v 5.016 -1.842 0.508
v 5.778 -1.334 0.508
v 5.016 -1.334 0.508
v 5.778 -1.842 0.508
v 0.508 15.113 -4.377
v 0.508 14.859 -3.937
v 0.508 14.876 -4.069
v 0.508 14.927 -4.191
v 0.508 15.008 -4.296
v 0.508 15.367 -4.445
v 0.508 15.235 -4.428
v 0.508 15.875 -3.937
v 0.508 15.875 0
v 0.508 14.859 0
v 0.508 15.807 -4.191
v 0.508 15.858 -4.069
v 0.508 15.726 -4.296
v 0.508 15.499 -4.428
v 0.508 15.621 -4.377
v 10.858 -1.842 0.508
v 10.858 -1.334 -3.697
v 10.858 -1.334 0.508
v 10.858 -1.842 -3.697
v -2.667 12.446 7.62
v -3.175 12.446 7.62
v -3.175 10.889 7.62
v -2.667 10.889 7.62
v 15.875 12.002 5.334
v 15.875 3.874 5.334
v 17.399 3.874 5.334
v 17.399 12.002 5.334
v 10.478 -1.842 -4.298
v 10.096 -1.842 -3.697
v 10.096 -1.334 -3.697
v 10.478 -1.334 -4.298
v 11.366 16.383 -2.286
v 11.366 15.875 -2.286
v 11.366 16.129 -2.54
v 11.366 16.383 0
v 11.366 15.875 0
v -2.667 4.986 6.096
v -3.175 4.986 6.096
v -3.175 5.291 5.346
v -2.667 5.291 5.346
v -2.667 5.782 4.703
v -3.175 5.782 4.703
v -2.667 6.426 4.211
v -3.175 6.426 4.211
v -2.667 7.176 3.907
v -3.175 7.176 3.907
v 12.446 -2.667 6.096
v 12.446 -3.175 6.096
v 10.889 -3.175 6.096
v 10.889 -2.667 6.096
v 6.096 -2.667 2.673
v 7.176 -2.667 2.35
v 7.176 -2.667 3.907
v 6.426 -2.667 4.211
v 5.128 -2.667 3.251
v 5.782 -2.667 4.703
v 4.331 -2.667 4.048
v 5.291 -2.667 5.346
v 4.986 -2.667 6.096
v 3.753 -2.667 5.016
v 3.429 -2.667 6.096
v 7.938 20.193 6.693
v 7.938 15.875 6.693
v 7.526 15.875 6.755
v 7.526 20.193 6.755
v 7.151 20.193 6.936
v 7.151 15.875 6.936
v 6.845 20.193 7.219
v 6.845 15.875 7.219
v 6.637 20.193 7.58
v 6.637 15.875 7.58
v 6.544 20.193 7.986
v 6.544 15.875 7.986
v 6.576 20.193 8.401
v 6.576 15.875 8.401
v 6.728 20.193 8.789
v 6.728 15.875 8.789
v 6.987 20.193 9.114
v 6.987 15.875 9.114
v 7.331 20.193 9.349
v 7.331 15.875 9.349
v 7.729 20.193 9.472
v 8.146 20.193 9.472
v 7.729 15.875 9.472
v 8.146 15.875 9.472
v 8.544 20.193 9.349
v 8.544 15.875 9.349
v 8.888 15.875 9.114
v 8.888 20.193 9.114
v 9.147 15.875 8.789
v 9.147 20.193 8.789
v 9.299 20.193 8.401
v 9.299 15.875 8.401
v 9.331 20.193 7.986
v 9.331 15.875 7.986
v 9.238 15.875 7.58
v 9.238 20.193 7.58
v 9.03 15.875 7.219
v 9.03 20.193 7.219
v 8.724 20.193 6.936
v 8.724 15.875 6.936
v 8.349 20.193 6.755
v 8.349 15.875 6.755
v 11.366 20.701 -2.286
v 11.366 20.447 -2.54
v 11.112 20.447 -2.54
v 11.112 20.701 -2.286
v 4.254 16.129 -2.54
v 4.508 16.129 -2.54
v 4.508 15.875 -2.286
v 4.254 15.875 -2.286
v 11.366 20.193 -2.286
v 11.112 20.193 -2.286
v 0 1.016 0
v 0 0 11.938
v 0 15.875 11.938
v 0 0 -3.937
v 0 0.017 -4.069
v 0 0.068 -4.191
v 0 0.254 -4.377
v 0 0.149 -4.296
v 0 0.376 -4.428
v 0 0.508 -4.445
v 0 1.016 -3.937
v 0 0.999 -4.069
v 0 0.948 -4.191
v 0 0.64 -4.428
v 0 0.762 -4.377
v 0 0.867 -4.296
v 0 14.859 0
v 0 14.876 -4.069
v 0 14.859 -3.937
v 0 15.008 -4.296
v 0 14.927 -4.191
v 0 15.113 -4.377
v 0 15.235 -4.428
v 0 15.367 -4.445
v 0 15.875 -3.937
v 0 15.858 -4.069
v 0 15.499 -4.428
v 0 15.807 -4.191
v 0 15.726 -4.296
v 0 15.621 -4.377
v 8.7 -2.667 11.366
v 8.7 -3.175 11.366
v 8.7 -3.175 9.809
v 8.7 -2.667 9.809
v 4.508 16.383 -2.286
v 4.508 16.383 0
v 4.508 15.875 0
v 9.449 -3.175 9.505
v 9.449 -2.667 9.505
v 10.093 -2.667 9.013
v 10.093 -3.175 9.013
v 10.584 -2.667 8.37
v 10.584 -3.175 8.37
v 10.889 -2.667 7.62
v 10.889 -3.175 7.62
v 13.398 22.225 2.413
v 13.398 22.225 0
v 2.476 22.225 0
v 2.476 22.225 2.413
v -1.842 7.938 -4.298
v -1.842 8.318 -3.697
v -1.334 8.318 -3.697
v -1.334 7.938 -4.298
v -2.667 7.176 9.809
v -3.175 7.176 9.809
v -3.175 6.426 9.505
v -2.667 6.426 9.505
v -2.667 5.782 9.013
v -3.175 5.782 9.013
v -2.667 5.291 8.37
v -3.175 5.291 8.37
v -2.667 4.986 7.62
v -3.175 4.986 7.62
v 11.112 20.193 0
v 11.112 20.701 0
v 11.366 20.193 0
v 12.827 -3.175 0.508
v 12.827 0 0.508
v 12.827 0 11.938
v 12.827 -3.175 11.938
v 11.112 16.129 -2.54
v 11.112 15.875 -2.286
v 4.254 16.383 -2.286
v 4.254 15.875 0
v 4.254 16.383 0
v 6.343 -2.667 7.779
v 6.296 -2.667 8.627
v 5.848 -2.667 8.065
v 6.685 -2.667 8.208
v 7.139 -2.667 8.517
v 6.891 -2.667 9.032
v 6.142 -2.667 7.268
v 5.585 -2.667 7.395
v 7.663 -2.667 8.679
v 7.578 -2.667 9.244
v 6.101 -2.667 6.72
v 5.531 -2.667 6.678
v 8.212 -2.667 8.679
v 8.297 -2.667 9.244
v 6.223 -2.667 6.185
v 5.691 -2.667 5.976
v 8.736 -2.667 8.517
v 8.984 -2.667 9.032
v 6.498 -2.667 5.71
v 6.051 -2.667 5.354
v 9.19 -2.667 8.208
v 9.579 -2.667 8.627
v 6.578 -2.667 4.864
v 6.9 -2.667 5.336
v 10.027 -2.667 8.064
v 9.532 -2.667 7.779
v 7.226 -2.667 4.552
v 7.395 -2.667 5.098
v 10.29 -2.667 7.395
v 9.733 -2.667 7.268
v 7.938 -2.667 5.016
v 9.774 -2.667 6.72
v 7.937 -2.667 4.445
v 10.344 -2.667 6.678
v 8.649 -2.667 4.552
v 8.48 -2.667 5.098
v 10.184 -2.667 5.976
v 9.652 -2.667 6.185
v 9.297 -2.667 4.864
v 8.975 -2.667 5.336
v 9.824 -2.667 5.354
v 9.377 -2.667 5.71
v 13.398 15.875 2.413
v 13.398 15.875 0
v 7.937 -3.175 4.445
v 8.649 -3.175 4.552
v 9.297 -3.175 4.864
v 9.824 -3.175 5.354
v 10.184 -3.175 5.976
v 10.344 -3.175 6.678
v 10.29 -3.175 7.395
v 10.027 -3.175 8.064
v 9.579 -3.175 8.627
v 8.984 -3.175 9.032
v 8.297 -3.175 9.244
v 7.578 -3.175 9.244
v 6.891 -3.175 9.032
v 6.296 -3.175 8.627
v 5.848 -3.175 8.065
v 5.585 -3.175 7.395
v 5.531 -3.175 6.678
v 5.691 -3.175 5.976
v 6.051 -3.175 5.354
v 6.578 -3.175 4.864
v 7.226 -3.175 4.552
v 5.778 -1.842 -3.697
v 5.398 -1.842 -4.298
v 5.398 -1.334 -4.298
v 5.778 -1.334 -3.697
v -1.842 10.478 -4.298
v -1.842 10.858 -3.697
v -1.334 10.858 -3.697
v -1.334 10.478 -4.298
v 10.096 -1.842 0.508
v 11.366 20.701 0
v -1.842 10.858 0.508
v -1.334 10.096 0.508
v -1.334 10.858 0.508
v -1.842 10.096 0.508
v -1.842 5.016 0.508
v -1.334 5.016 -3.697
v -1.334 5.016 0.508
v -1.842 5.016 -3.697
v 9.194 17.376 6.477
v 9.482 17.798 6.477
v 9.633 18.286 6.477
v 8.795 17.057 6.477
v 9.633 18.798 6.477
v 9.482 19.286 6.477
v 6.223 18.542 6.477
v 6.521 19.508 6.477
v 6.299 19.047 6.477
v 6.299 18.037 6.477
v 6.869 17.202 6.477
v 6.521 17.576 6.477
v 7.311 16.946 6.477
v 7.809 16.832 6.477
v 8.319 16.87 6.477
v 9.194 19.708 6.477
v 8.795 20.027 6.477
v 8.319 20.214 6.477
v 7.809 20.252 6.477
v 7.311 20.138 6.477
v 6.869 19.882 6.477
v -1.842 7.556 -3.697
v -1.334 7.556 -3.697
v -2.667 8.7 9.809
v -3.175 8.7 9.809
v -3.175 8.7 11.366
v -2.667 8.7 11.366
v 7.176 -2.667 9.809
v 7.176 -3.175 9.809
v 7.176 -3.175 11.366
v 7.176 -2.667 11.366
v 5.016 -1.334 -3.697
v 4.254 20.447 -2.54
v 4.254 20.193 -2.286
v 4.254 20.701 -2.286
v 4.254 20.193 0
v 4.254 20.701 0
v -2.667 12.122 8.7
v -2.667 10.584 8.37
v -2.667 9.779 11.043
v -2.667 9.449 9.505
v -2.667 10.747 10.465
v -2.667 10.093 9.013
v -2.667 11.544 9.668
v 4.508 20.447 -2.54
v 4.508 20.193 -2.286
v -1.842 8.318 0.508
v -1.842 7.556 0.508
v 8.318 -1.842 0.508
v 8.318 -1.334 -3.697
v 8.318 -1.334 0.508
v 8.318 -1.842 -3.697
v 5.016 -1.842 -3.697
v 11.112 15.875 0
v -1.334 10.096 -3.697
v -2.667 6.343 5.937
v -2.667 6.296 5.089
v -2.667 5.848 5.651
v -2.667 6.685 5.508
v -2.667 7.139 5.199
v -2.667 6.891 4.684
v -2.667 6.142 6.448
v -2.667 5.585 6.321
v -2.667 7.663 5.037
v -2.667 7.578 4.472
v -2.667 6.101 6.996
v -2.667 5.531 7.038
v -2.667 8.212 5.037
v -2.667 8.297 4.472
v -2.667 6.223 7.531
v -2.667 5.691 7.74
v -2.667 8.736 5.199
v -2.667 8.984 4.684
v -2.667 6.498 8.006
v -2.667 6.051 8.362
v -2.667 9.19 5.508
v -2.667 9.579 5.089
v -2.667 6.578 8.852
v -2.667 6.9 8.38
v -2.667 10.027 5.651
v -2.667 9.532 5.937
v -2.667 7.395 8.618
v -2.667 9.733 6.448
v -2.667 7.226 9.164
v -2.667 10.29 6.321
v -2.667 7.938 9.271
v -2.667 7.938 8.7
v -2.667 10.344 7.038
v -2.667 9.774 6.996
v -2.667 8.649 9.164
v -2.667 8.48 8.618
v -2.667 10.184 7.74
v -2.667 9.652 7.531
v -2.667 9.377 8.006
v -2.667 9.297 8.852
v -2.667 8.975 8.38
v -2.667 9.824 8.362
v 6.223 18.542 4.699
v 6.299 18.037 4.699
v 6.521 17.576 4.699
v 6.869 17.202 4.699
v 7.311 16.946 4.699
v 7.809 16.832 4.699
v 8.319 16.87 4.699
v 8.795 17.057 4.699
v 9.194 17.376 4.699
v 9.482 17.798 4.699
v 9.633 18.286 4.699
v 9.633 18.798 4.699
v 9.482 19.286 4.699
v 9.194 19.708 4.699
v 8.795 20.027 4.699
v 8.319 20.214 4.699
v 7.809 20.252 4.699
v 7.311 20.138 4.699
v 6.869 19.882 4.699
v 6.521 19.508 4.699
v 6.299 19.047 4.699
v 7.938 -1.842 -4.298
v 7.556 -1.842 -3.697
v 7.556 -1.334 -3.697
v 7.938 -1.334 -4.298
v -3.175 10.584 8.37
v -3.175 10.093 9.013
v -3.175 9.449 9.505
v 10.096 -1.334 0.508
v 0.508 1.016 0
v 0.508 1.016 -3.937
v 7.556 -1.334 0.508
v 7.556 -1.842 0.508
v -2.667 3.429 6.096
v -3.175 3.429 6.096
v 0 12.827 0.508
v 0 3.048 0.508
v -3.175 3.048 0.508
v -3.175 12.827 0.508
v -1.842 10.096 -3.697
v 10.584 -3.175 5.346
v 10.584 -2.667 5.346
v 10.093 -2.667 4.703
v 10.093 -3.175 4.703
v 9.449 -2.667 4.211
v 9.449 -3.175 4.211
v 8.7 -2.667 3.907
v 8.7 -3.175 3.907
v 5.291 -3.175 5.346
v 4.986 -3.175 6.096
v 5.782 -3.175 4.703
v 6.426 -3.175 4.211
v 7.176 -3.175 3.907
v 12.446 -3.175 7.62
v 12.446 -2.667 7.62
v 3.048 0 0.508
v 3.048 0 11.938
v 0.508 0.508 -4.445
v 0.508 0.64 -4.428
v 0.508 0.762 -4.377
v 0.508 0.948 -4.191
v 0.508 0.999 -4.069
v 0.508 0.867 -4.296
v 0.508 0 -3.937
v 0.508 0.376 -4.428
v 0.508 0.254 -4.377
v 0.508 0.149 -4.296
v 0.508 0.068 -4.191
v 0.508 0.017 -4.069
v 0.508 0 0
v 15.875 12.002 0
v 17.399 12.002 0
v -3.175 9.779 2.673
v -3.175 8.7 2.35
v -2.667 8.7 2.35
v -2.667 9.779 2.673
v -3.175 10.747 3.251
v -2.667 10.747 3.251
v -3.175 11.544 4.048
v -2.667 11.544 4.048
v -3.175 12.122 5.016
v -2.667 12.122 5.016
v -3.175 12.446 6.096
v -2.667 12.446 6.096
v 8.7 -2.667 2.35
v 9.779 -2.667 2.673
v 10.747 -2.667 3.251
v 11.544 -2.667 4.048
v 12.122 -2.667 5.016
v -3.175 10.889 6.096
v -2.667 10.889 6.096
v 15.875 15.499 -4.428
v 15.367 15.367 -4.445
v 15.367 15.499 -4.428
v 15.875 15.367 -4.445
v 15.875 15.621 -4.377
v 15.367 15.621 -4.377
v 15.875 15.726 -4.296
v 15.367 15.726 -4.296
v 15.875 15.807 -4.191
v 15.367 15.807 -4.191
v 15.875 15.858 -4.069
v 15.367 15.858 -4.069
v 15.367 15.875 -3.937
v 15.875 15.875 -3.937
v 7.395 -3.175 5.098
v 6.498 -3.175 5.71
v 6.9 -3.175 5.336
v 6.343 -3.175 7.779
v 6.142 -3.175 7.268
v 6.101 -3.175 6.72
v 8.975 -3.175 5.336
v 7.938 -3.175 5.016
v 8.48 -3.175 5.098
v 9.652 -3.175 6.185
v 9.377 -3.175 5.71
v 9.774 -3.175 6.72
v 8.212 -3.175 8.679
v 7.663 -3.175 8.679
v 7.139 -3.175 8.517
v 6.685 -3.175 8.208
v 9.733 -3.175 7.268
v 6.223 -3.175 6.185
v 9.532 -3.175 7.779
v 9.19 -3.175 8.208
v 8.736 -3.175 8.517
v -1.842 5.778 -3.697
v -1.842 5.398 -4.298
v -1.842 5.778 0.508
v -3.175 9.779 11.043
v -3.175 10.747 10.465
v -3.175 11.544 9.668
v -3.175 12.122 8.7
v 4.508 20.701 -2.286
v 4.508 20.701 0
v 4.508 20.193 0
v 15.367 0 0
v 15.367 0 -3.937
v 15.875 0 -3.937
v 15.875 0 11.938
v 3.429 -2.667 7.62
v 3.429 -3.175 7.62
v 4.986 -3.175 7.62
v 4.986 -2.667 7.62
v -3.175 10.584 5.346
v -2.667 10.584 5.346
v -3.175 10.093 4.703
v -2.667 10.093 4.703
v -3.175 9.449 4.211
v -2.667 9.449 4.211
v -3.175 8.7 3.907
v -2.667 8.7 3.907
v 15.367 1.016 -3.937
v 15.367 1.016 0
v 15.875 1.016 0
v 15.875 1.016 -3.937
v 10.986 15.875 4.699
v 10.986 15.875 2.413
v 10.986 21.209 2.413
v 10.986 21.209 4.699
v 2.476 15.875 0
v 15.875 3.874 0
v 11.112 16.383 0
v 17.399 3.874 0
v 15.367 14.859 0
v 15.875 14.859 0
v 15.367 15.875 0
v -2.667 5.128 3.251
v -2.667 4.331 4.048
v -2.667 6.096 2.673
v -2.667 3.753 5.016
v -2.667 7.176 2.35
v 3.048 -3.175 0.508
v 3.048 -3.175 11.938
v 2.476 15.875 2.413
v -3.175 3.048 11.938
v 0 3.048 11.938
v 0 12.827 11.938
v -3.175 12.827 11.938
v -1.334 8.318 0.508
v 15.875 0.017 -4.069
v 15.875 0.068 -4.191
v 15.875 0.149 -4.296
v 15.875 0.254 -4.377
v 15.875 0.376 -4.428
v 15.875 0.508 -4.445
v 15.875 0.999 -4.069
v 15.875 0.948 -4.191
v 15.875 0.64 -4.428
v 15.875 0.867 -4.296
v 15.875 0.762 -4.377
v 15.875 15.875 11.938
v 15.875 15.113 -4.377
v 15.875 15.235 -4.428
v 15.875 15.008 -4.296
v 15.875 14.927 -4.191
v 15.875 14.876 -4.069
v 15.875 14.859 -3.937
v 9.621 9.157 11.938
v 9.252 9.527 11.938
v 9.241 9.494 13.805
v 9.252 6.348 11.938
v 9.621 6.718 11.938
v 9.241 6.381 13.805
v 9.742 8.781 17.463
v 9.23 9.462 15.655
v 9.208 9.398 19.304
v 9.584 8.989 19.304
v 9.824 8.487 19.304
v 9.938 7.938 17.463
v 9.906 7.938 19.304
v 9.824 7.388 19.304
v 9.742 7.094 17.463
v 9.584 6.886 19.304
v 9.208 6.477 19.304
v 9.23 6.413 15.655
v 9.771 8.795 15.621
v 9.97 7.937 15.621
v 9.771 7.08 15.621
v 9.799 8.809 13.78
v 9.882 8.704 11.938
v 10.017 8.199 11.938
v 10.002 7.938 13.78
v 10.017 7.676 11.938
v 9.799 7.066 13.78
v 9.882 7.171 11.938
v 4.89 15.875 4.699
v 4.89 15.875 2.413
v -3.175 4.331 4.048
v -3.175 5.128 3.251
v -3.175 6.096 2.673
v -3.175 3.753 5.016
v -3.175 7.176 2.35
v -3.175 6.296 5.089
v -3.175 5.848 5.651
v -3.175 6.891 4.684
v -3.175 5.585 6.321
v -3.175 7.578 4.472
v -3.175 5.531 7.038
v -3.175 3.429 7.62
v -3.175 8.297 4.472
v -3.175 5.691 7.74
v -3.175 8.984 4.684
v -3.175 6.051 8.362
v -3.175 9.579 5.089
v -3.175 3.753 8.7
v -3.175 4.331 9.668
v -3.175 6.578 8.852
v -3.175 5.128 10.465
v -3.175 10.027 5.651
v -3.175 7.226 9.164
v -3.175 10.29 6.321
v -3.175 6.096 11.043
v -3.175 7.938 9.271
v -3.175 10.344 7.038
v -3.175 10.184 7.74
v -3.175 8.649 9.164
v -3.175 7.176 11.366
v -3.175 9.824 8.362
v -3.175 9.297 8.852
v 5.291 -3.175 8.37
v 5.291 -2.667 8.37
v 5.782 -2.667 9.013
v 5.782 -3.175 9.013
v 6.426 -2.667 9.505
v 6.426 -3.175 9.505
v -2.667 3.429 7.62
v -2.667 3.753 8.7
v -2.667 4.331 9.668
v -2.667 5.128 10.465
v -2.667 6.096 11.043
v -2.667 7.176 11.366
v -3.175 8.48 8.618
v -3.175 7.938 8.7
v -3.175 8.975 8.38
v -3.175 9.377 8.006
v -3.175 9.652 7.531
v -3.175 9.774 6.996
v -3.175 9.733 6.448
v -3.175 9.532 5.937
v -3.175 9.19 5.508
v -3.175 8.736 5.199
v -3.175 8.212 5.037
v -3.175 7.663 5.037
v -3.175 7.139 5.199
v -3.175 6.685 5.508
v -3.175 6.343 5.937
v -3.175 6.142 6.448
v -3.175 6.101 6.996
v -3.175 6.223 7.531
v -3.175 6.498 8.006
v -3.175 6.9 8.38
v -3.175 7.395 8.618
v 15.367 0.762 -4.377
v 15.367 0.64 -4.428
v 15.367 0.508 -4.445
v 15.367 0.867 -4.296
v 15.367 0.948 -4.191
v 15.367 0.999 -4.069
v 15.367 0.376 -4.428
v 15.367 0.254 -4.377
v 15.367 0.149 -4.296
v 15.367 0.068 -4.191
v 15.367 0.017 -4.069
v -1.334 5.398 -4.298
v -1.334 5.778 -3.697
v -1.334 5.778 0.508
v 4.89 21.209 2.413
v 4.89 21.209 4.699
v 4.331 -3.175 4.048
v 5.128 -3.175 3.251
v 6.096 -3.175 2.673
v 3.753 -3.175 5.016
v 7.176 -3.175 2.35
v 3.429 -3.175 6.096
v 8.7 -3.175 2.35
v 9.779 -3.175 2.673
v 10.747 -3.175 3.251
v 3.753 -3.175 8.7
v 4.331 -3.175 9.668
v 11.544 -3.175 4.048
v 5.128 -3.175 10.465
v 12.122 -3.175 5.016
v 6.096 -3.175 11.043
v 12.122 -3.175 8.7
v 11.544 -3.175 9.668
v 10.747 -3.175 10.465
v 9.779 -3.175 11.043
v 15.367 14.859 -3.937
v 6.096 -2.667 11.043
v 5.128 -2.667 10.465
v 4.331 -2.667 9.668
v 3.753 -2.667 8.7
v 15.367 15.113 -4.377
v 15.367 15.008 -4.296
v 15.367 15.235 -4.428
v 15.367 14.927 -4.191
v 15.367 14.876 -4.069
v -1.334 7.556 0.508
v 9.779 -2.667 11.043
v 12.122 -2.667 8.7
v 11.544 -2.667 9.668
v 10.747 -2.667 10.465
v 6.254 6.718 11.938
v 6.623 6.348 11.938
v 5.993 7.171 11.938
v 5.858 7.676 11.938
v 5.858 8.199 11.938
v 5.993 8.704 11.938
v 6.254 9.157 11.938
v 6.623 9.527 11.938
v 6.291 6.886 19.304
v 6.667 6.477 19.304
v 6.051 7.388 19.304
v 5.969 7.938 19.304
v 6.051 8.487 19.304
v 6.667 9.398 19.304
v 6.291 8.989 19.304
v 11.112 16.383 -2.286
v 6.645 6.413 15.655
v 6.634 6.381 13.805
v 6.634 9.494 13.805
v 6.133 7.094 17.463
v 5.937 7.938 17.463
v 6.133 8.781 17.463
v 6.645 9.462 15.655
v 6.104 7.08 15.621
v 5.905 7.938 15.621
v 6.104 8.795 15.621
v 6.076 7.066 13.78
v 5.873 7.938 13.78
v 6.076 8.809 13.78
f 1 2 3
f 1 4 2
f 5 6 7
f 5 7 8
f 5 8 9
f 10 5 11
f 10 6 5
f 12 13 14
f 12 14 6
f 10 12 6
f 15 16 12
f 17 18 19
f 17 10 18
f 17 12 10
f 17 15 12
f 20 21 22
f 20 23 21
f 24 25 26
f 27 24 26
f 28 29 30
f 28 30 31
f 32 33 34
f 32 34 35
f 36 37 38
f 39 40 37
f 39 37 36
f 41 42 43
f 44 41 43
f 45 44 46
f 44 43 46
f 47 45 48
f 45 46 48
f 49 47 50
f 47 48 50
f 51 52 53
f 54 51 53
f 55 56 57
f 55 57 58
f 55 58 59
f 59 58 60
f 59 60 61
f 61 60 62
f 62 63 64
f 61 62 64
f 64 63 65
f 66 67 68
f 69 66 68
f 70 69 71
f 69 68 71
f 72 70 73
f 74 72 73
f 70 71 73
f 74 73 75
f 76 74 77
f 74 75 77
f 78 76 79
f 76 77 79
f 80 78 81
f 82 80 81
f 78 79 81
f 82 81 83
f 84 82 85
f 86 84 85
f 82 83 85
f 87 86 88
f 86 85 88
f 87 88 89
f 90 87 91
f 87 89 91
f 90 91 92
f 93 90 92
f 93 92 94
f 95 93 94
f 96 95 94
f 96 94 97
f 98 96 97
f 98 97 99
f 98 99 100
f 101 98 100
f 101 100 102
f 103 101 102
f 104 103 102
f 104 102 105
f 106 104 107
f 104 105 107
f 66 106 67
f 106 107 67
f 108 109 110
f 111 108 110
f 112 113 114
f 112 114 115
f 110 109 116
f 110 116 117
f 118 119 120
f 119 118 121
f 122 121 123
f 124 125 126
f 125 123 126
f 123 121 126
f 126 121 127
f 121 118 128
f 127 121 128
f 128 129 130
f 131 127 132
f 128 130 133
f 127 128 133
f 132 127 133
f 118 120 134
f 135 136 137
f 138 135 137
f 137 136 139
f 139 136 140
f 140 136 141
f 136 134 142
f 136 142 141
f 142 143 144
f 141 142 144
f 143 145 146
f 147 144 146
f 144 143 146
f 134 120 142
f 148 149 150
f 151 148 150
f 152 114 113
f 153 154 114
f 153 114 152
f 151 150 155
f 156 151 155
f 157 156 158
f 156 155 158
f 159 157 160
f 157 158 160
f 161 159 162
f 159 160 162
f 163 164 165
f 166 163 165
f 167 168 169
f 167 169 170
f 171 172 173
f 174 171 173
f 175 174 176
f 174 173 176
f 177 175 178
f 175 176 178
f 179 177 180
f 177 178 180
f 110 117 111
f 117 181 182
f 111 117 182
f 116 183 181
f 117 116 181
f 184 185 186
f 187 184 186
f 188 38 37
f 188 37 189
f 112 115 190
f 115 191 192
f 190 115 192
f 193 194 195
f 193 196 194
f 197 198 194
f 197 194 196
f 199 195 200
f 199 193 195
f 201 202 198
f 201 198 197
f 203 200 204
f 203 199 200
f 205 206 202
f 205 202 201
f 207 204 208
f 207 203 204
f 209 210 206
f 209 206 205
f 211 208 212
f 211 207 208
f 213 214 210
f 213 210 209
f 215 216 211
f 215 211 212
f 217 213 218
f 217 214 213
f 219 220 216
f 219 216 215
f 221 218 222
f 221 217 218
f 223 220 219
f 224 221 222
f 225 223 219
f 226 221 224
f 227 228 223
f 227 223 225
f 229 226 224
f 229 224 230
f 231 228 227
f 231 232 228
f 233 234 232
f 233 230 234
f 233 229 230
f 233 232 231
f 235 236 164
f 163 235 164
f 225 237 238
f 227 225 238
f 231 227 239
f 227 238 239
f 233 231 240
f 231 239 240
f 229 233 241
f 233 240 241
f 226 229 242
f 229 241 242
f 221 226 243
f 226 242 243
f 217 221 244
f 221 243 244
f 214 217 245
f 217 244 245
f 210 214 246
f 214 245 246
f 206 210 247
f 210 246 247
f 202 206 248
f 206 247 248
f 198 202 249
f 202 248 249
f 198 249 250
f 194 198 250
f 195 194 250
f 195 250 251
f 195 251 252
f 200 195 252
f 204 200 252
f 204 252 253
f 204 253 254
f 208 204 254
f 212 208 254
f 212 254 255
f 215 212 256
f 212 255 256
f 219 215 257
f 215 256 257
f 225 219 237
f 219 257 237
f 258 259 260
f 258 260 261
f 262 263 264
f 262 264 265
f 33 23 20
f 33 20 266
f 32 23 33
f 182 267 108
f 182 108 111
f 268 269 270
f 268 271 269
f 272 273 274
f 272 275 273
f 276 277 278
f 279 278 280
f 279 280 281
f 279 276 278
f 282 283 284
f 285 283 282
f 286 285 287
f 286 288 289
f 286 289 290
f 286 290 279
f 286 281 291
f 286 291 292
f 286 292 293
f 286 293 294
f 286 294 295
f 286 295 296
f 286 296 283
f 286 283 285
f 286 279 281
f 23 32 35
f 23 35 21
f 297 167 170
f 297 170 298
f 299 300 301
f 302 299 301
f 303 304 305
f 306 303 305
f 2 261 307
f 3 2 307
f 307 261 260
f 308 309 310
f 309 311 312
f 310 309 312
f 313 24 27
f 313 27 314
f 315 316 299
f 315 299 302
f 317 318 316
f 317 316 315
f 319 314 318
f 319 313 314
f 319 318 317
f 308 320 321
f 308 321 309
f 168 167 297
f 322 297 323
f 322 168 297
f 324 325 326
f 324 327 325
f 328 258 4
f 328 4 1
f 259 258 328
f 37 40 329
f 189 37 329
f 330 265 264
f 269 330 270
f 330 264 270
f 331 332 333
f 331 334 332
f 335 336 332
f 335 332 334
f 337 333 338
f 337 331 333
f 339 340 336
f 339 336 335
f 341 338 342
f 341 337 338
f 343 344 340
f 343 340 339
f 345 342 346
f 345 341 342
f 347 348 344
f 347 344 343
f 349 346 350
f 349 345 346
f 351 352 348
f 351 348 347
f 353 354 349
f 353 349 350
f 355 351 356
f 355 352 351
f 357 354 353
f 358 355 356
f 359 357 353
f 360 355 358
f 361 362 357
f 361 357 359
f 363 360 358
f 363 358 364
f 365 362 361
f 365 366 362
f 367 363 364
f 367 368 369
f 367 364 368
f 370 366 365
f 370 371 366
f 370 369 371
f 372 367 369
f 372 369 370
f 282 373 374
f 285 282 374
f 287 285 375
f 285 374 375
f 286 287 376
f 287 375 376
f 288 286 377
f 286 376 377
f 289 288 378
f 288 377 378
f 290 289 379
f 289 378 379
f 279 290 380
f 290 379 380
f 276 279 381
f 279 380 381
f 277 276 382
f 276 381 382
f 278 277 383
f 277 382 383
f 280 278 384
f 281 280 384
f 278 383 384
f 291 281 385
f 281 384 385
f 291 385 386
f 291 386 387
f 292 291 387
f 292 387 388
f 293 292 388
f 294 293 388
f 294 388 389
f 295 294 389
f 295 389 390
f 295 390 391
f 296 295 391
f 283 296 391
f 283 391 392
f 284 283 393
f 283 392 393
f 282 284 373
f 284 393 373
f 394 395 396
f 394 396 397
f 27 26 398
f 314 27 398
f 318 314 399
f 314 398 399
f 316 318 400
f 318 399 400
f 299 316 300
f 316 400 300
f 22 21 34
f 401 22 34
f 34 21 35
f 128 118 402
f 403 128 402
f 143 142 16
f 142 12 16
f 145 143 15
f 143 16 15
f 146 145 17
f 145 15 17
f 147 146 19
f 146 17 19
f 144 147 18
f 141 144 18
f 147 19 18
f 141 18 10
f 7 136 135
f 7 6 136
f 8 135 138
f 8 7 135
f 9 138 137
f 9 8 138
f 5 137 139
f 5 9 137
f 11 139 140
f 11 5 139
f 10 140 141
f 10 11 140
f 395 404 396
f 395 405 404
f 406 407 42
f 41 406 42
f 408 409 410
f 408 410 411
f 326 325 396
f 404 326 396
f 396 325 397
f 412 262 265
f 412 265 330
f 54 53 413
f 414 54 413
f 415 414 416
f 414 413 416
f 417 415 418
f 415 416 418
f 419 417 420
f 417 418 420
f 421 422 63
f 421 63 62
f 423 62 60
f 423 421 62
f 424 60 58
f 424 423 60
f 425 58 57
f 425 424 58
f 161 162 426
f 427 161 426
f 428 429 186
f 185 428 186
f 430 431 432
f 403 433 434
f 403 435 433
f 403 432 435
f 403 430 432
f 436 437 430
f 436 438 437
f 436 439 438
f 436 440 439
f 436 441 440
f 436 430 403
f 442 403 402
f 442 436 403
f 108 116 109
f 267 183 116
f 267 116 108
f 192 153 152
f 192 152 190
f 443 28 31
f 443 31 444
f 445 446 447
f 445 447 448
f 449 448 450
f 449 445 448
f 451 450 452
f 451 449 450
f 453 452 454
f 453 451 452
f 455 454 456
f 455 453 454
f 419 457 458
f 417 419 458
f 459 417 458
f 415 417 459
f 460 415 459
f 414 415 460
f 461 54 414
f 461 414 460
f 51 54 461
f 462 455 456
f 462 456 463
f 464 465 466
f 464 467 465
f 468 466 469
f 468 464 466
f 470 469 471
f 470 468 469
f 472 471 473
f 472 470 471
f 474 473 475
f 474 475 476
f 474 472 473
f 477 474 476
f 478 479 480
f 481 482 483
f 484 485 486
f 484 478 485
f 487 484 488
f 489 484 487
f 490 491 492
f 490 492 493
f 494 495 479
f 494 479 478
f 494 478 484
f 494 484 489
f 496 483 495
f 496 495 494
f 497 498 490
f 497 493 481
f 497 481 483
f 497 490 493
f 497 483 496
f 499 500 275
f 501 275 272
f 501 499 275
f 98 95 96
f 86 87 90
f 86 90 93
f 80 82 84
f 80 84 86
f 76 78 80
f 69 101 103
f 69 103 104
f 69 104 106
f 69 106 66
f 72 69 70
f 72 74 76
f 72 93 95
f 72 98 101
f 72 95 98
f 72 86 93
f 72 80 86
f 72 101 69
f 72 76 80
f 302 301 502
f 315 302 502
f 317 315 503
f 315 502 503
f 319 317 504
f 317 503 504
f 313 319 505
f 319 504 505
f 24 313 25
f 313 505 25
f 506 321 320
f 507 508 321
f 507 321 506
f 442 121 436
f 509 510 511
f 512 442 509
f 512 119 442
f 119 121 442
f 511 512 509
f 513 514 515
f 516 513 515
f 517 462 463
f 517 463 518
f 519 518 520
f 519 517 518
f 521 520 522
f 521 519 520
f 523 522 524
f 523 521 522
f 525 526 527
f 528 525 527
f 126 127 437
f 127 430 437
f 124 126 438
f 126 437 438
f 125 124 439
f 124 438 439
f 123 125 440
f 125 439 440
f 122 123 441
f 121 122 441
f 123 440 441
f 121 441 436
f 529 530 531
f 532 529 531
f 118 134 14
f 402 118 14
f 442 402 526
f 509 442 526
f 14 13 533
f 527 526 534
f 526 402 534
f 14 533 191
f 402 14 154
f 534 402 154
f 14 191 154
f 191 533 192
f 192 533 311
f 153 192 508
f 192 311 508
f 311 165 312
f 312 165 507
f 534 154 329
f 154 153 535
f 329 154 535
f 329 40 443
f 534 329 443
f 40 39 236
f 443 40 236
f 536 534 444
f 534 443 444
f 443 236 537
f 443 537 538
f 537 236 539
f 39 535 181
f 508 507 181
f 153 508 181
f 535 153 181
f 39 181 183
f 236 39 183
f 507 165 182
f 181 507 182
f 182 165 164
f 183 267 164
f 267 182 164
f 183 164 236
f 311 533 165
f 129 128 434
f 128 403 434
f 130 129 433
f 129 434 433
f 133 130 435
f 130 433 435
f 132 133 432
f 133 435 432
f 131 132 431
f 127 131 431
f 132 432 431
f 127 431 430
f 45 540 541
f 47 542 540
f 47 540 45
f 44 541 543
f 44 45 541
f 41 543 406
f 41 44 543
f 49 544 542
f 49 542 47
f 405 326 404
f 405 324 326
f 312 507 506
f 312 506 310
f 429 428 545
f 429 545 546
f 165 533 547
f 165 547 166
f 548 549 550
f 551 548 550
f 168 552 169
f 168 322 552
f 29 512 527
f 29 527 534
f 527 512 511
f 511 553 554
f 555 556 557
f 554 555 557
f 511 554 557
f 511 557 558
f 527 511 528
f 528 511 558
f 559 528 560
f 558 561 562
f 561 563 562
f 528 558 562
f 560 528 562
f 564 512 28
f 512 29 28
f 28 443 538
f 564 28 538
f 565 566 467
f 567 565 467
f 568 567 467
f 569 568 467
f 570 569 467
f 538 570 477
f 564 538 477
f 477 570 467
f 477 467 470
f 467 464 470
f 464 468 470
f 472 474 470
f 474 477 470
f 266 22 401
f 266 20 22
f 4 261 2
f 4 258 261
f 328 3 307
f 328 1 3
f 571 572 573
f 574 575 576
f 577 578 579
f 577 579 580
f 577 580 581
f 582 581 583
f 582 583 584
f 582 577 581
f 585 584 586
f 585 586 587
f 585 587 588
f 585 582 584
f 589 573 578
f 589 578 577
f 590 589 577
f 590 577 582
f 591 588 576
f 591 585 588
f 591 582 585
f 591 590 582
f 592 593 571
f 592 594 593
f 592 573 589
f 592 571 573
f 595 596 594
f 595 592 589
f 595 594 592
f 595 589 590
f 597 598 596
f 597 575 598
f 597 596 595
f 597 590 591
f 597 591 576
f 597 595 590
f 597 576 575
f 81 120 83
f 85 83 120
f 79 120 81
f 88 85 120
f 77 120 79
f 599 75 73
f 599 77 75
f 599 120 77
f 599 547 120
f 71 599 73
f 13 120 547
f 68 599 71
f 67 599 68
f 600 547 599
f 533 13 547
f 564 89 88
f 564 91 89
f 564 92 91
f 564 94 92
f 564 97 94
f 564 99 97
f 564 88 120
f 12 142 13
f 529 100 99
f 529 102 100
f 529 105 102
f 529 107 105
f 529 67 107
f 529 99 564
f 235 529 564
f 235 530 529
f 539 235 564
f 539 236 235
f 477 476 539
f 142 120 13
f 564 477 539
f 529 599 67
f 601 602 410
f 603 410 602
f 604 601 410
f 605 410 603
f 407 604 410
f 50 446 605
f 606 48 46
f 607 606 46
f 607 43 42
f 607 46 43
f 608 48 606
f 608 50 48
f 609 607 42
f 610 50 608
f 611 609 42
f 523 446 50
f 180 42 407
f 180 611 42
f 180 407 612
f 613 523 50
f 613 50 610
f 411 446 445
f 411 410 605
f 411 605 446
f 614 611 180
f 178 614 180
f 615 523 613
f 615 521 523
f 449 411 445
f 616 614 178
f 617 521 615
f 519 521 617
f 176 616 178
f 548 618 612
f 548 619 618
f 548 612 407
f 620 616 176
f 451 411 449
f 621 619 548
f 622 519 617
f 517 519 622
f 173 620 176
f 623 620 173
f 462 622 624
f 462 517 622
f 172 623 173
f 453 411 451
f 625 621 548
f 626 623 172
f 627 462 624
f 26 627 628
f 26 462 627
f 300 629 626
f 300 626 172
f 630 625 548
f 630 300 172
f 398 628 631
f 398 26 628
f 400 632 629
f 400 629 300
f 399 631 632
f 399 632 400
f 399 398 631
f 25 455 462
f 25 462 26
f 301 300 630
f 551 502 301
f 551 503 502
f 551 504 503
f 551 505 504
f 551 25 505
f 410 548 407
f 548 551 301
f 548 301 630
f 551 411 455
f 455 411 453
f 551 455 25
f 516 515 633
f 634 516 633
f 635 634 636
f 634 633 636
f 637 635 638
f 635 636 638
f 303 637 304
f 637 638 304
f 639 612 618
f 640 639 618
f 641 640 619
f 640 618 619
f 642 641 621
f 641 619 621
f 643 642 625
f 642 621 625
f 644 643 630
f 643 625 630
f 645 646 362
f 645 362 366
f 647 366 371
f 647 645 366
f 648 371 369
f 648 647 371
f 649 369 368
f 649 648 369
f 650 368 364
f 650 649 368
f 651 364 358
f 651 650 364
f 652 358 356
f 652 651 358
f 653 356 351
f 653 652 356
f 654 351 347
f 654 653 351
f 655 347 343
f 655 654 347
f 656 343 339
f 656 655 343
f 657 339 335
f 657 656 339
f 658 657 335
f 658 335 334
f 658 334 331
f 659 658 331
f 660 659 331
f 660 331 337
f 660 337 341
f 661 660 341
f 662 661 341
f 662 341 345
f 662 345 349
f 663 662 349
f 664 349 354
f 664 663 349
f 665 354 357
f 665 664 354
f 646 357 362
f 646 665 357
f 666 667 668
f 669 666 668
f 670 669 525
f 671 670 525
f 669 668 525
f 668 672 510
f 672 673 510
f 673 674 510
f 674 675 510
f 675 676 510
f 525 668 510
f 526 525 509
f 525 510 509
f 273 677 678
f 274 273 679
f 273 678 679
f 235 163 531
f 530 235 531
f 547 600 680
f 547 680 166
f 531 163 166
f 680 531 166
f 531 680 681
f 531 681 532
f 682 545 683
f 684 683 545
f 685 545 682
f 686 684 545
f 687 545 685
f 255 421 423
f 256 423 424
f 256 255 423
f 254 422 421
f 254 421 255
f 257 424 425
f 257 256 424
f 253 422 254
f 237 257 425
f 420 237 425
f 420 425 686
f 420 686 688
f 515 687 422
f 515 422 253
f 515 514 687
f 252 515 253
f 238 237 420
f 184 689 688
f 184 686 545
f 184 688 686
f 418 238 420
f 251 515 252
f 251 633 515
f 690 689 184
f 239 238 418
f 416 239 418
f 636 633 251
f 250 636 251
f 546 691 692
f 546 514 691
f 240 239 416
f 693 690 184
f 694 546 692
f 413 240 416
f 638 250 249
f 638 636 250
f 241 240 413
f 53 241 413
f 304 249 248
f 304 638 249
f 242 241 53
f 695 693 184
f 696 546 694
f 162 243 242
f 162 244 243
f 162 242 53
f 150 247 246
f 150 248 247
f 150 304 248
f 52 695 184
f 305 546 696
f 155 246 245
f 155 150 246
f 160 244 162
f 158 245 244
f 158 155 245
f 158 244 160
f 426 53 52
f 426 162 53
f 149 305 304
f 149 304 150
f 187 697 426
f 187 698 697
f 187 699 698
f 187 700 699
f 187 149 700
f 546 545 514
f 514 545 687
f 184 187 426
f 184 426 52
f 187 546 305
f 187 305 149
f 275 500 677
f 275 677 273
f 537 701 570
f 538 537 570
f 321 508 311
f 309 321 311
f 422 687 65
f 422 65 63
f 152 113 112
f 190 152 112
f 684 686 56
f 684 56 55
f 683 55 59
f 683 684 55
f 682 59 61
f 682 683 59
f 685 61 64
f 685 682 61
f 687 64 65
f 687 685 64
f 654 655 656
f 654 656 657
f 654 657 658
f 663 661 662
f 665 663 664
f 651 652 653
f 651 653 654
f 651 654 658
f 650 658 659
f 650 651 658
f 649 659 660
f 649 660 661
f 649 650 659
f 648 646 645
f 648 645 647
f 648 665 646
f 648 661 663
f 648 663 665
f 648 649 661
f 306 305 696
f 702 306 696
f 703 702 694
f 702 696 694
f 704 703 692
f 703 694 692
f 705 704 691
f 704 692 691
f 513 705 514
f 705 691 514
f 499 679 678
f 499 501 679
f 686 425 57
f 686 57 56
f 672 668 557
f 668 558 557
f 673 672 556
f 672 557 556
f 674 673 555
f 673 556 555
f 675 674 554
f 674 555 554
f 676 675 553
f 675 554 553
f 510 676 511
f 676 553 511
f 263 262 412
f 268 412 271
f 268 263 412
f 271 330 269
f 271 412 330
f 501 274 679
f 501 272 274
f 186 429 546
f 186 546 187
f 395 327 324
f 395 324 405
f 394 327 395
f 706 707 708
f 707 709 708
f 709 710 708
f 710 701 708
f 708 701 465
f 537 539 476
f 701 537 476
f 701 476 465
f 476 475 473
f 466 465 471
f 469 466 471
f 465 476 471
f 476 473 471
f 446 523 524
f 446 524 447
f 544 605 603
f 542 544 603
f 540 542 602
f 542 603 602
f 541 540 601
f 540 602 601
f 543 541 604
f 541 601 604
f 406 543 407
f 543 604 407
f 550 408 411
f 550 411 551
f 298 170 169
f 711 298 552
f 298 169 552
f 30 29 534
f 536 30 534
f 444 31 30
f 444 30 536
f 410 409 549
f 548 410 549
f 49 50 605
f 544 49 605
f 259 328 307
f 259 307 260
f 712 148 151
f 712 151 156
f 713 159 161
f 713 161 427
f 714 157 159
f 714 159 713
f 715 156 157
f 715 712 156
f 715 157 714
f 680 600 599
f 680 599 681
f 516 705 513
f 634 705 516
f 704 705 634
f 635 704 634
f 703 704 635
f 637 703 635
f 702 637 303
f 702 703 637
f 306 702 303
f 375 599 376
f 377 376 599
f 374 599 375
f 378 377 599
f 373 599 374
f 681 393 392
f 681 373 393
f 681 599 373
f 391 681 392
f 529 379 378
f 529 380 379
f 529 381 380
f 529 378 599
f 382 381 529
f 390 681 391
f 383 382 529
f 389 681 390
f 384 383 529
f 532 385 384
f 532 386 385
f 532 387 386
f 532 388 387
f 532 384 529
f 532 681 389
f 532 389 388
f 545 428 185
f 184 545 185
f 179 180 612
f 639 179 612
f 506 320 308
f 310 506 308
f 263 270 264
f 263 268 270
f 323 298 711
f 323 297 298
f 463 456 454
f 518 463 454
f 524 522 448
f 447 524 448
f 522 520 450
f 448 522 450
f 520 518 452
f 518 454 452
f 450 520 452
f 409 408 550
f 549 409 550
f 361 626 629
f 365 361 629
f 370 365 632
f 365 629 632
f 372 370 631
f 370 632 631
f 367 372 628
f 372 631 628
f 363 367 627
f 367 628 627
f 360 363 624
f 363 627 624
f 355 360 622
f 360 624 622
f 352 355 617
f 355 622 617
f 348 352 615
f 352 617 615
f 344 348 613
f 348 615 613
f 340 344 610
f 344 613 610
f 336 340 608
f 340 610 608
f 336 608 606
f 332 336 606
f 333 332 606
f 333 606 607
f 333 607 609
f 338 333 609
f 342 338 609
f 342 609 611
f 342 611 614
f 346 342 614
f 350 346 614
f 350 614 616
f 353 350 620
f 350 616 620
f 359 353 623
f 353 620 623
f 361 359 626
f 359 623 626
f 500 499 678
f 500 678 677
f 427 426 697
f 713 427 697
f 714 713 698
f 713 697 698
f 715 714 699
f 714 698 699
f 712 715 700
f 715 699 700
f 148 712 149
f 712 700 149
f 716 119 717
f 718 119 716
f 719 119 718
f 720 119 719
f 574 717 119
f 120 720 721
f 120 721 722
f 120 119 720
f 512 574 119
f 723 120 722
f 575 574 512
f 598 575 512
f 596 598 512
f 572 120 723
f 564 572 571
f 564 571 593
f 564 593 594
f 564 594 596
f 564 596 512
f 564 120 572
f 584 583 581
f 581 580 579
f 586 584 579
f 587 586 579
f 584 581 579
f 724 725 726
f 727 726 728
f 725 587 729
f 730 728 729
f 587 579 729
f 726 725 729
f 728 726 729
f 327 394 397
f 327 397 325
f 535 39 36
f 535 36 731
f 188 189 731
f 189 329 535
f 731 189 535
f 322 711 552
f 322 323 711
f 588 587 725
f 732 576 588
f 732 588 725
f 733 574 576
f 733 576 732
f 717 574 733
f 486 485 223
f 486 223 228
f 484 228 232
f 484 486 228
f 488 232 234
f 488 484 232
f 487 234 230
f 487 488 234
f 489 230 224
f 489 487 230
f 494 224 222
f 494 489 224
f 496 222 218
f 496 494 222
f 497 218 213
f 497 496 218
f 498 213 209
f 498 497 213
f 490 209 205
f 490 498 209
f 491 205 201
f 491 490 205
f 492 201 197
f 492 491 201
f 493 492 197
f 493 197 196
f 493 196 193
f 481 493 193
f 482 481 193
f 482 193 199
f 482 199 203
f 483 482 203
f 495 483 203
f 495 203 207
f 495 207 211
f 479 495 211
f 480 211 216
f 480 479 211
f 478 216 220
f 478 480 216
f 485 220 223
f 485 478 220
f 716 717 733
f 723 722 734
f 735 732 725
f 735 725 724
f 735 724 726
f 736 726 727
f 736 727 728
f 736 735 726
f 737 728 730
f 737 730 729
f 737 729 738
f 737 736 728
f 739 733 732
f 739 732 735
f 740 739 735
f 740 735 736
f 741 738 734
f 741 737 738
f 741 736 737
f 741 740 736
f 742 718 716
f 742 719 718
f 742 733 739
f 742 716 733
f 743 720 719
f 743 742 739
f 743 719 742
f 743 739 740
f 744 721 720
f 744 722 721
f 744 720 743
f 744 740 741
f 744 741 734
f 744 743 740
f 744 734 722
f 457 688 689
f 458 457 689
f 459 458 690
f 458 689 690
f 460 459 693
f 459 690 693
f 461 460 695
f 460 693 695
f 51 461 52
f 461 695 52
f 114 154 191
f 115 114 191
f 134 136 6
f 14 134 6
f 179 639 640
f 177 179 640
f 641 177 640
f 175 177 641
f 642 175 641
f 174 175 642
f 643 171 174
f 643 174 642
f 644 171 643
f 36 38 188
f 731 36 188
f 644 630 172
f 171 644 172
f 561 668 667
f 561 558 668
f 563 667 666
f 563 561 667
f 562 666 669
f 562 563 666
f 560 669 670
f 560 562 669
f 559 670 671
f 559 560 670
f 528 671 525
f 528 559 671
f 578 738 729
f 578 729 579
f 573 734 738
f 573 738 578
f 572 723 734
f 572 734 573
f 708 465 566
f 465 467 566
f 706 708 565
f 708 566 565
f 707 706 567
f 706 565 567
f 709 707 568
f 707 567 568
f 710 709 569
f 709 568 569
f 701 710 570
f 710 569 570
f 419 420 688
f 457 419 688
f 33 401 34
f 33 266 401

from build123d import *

# Parameters (mm, degrees)
SKETCH1_W              = 15.875
SKETCH1_H              = 15.875
BOSS_EXTRUDE1_DEPTH    = 11.938
SKETCH2_W              = 10.922
SKETCH2_H              = 6.35
BOSS_EXTRUDE2_DEPTH    = 2.413
SKETCH3_W              = 5.334
SKETCH3_H              = 8.128
BOSS_EXTRUDE3_DEPTH    = 1.524
SKETCH4_W              = 6.096
SKETCH4_H              = 5.334
BOSS_EXTRUDE4_DEPTH    = 2.286
SKETCH5_R              = 1.7145
BOSS_EXTRUDE5_DEPTH    = 1.778
SKETCH6_R              = 1.397
BOSS_EXTRUDE6_DEPTH    = 4.318
SKETCH7_W              = 9.779
SKETCH7_H              = 11.43
BOSS_EXTRUDE7_DEPTH    = 3.175
SKETCH8_W              = 11.43
SKETCH8_H              = 9.779
BOSS_EXTRUDE8_DEPTH    = 3.175
SKETCH9_R              = 2.413
SKETCH9_R_2            = 1.8415
CUT_EXTRUDE1_DEPTH     = 0.508
SKETCH10_R             = 2.413
SKETCH10_R_2           = 1.8415
CUT_EXTRUDE2_DEPTH     = 0.508
SKETCH12_W             = 0.508
SKETCH12_H             = 4.445
EXTRUDE_THIN1_DEPTH    = 1.016
SKETCH13_W             = 0.508
SKETCH13_H             = 4.445
EXTRUDE_THIN2_DEPTH    = 1.016
FILLET1_R              = 0.508
BOSS_EXTRUDE9_DEPTH    = 0.254
BOSS_EXTRUDE9_2_DEPTH  = 0.254
BOSS_EXTRUDE9_3_DEPTH  = 0.254
BOSS_EXTRUDE10_DEPTH   = 0.254
BOSS_EXTRUDE10_2_DEPTH = 0.254
BOSS_EXTRUDE10_3_DEPTH = 0.254
SKETCH16_W             = 0.254
SKETCH16_H             = 0.508
BOSS_EXTRUDE11_DEPTH   = 2.54
CHAMFER1_SIZE          = 0.254
BOSS_EXTRUDE12_DEPTH   = 7.366
DRAFT1_ANGLE           = 1


with BuildPart() as part:
    # Sketch1 → Boss-Extrude1 (new body)
    with BuildSketch(Plane.XY):
        with Locations((7.9375, 7.9375)):
            Rectangle(SKETCH1_W, SKETCH1_H)
    extrude(amount=BOSS_EXTRUDE1_DEPTH)

    # Sketch2 → Boss-Extrude2 (add)
    with BuildSketch(Plane(origin=(0, 0, 0), x_dir=(-1, 0, 0), z_dir=(0, 0, -1))):
        with Locations((-7.9375, 19.05)):
            Rectangle(SKETCH2_W, SKETCH2_H)
    extrude(amount=-BOSS_EXTRUDE2_DEPTH)

    # Sketch3 → Boss-Extrude3 (add)
    with BuildSketch(Plane(origin=(15.875, 0, 0), x_dir=(0, 0, -1), z_dir=(1, 0, 0))):
        with Locations((-2.667, 7.9375)):
            Rectangle(SKETCH3_W, SKETCH3_H)
    extrude(amount=BOSS_EXTRUDE3_DEPTH)

    # Sketch4 → Boss-Extrude4 (add)
    with BuildSketch(Plane.XY.offset(2.413)):
        with Locations((7.9375, 18.542)):
            Rectangle(SKETCH4_W, SKETCH4_H)
    extrude(amount=BOSS_EXTRUDE4_DEPTH)

    # Sketch5 → Boss-Extrude5 (add)
    with BuildSketch(Plane.XY.offset(4.699)):
        with Locations(Location((7.9375, 18.542, 0), (0, 0, 180))):
            Circle(SKETCH5_R)
    extrude(amount=BOSS_EXTRUDE5_DEPTH)

    # Sketch6 → Boss-Extrude6 (add)
    with BuildSketch(Plane(origin=(0, 15.875, 0), x_dir=(1, 0, 0), z_dir=(0, 1, 0))):
        with Locations(Location((7.9375, -8.090189982, 0), (0, 0, 90))):
            Circle(SKETCH6_R)
    extrude(amount=BOSS_EXTRUDE6_DEPTH)

    # Sketch12 → Extrude-Thin1 (add)
    with BuildSketch(Plane.XZ):
        with Locations((0.254, -2.2225)):
            Rectangle(SKETCH12_W, SKETCH12_H)
        with Locations((15.621, -2.2225)):
            Rectangle(SKETCH12_W, SKETCH12_H)
    extrude(amount=-EXTRUDE_THIN1_DEPTH)

    # Sketch13 → Extrude-Thin2 (add)
    with BuildSketch(Plane(origin=(0, 15.875, 0), x_dir=(1, 0, 0), z_dir=(0, 1, 0))):
        with Locations((0.254, 2.2225)):
            Rectangle(SKETCH13_W, SKETCH13_H)
        with Locations((15.621, 2.2225)):
            Rectangle(SKETCH13_W, SKETCH13_H)
    extrude(amount=-EXTRUDE_THIN2_DEPTH)

    # Fillet1
    fillet1_edges = [part.edges().sort_by_distance(p)[0] for p in [
        (0.254, 1.016, -4.445),
        (0.254, 15.875, -4.445),
        (0.254, 14.859, -4.445),
        (15.621, 15.875, -4.445),
        (15.621, 14.859, -4.445),
        (15.621, 1.016, -4.445),
        (15.621, 0, -4.445),
        (0.254, 0, -4.445),
    ]]
    fillet(fillet1_edges, radius=FILLET1_R - 0.0001)  # a hair under: the kernel refuses the full size

    # Sketch16 → Boss-Extrude11 (add)
    with BuildSketch(Plane(origin=(0, 0, 0), x_dir=(-1, 0, 0), z_dir=(0, 0, -1))):
        with Locations((-11.2395, 20.447)):
            Rectangle(SKETCH16_W, SKETCH16_H)
        with Locations((-4.3815, 20.447)):
            Rectangle(SKETCH16_W, SKETCH16_H)
        with Locations((-4.3815, 16.129)):
            Rectangle(SKETCH16_W, SKETCH16_H)
        with Locations((-11.2395, 16.129)):
            Rectangle(SKETCH16_W, SKETCH16_H)
    extrude(amount=BOSS_EXTRUDE11_DEPTH)

    # Chamfer1
    chamfer1_edges = [part.edges().sort_by_distance(p)[0] for p in [
        (11.2395, 15.875, -2.54),
        (11.2395, 16.383, -2.54),
        (4.3815, 15.875, -2.54),
        (4.3815, 16.383, -2.54),
        (4.3815, 20.193, -2.54),
        (4.3815, 20.701, -2.54),
        (11.2395, 20.193, -2.54),
        (11.2395, 20.701, -2.54),
    ]]
    chamfer(chamfer1_edges, length=CHAMFER1_SIZE - 0.0001)  # a hair under: the kernel refuses the full size

    # Sketch17 → Boss-Extrude12 (add)
    with BuildSketch(Plane.XY.offset(11.938)):
        with BuildLine():
            Line((6.6675, 9.398), (9.2075, 9.398))
            ThreePointArc((9.2075, 9.398), (9.906, 7.9375), (9.2075, 6.477))
            Line((9.2075, 6.477), (6.6675, 6.477))
            ThreePointArc((6.6675, 6.477), (5.969, 7.9375), (6.6675, 9.398))
        make_face()
    extrude(amount=BOSS_EXTRUDE12_DEPTH)

    # Draft1
    draft1_faces = [part.faces().sort_by_distance(p)[0] for p in [
        (9.906, 7.9375, 15.621),
        (7.9375, 9.398, 15.621),
        (5.969, 7.9375, 15.621),
        (7.9375, 6.477, 15.621),
    ]]
    draft(draft1_faces, Plane(origin=(7.845136364, 7.9375, 19.304), x_dir=(1, 0, 0), z_dir=(0, 0, 1)), DRAFT1_ANGLE)


with BuildPart() as body_2:
    # Sketch7 → Boss-Extrude7 (new body)
    with BuildSketch(Plane.XZ):
        with Locations((7.9375, 6.223)):
            Rectangle(SKETCH7_W, SKETCH7_H)
    extrude(amount=BOSS_EXTRUDE7_DEPTH)

    # Sketch10 → Cut-Extrude2 (cut)
    # profile 1 of 5: a face of its own
    with BuildSketch(Plane.XZ.offset(3.175)):
        with Locations(Location((7.9375, 6.858, 0), (0, 0, 270))):
            Circle(SKETCH10_R)
        with Locations(Location((7.9375, 6.858, 0), (0, 0, 270))):
            Circle(SKETCH10_R_2, mode=Mode.SUBTRACT)
    # profile 2 of 5: a face of its own
    with BuildSketch(Plane.XZ.offset(3.175)):
        with BuildLine():
            Line((3.429447205, 7.62), (4.98628669, 7.62))
            ThreePointArc((4.98628669, 7.62), (5.782238531, 9.013261469), (7.1755, 9.80921331))
            Line((7.1755, 9.80921331), (7.1755, 11.366052795))
            ThreePointArc((7.1755, 11.366052795), (4.704607796, 10.090892204), (3.429447205, 7.62))
        make_face()
    # profile 3 of 5: a face of its own
    with BuildSketch(Plane.XZ.offset(3.175)):
        with BuildLine():
            Line((3.429447205, 6.096), (4.98628669, 6.096))
            ThreePointArc((4.98628669, 6.096), (5.782238531, 4.702738531), (7.1755, 3.90678669))
            Line((7.1755, 3.90678669), (7.1755, 2.349947205))
            ThreePointArc((7.1755, 2.349947205), (4.704607796, 3.625107796), (3.429447205, 6.096))
        make_face()
    # profile 4 of 5: a face of its own
    with BuildSketch(Plane.XZ.offset(3.175)):
        with BuildLine():
            Line((8.6995, 11.366052795), (8.6995, 9.80921331))
            ThreePointArc((8.6995, 9.80921331), (10.092761469, 9.013261469), (10.88871331, 7.62))
            Line((10.88871331, 7.62), (12.445552795, 7.62))
            ThreePointArc((12.445552795, 7.62), (11.170392204, 10.090892204), (8.6995, 11.366052795))
        make_face()
    # profile 5 of 5: a face of its own
    with BuildSketch(Plane.XZ.offset(3.175)):
        with BuildLine():
            Line((12.445552795, 6.096), (10.88871331, 6.096))
            ThreePointArc((10.88871331, 6.096), (10.092761469, 4.702738531), (8.6995, 3.90678669))
            Line((8.6995, 3.90678669), (8.6995, 2.349947205))
            ThreePointArc((8.6995, 2.349947205), (11.170392204, 3.625107796), (12.445552795, 6.096))
        make_face()
    extrude(amount=-CUT_EXTRUDE2_DEPTH, mode=Mode.SUBTRACT)


with BuildPart() as body_3:
    # Sketch8 → Boss-Extrude8 (new body)
    with BuildSketch(Plane.ZY):
        with Locations((6.223, 7.9375)):
            Rectangle(SKETCH8_W, SKETCH8_H)
    extrude(amount=BOSS_EXTRUDE8_DEPTH)

    # Sketch9 → Cut-Extrude1 (cut)
    # profile 1 of 5: a face of its own
    with BuildSketch(Plane.ZY.offset(3.175)):
        with Locations((6.858, 7.9375)):
            Circle(SKETCH9_R)
        with Locations((6.858, 7.9375)):
            Circle(SKETCH9_R_2, mode=Mode.SUBTRACT)
    # profile 2 of 5: a face of its own
    with BuildSketch(Plane.ZY.offset(3.175)):
        with BuildLine():
            Line((7.62, 12.445552795), (7.62, 10.88871331))
            ThreePointArc((7.62, 10.88871331), (9.013261469, 10.092761469), (9.80921331, 8.6995))
            Line((9.80921331, 8.6995), (11.366052795, 8.6995))
            ThreePointArc((11.366052795, 8.6995), (10.090892204, 11.170392204), (7.62, 12.445552795))
        make_face()
    # profile 3 of 5: a face of its own
    with BuildSketch(Plane.ZY.offset(3.175)):
        with BuildLine():
            Line((6.096, 12.445552795), (6.096, 10.88871331))
            ThreePointArc((6.096, 10.88871331), (4.702738531, 10.092761469), (3.90678669, 8.6995))
            Line((3.90678669, 8.6995), (2.349947205, 8.6995))
            ThreePointArc((2.349947205, 8.6995), (3.625107796, 11.170392204), (6.096, 12.445552795))
        make_face()
    # profile 4 of 5: a face of its own
    with BuildSketch(Plane.ZY.offset(3.175)):
        with BuildLine():
            Line((11.366052795, 7.1755), (9.80921331, 7.1755))
            ThreePointArc((9.80921331, 7.1755), (9.013261469, 5.782238531), (7.62, 4.98628669))
            Line((7.62, 4.98628669), (7.62, 3.429447205))
            ThreePointArc((7.62, 3.429447205), (10.090892204, 4.704607796), (11.366052795, 7.1755))
        make_face()
    # profile 5 of 5: a face of its own
    with BuildSketch(Plane.ZY.offset(3.175)):
        with BuildLine():
            Line((6.096, 3.429447205), (6.096, 4.98628669))
            ThreePointArc((6.096, 4.98628669), (4.702738531, 5.782238531), (3.90678669, 7.1755))
            Line((3.90678669, 7.1755), (2.349947205, 7.1755))
            ThreePointArc((2.349947205, 7.1755), (3.625107796, 4.704607796), (6.096, 3.429447205))
        make_face()
    extrude(amount=-CUT_EXTRUDE1_DEPTH, mode=Mode.SUBTRACT)


with BuildPart() as body_4:
    # Sketch14 → Boss-Extrude9 (new, symmetric)
    with BuildSketch(Plane(origin=(0, -1.5875, 0), x_dir=(-1, 0, 0), z_dir=(0, -1, 0))):
        Polygon((-10.0965, -0.508), (-10.0965, 3.697342898), (-10.4775, 4.298407671), (-10.8585, 3.697342898), (-10.8585, -0.508), align=None)
    extrude(amount=BOSS_EXTRUDE9_DEPTH, both=True)


with BuildPart() as body_5:
    # Sketch14 → Boss-Extrude9 2 (new, symmetric)
    with BuildSketch(Plane(origin=(0, -1.5875, 0), x_dir=(-1, 0, 0), z_dir=(0, -1, 0))):
        Polygon((-7.5565, -0.508), (-7.5565, 3.697342898), (-7.9375, 4.298407671), (-8.3185, 3.697342898), (-8.3185, -0.508), align=None)
    extrude(amount=BOSS_EXTRUDE9_2_DEPTH, both=True)


with BuildPart() as body_6:
    # Sketch14 → Boss-Extrude9 3 (new, symmetric)
    with BuildSketch(Plane(origin=(0, -1.5875, 0), x_dir=(-1, 0, 0), z_dir=(0, -1, 0))):
        Polygon((-5.0165, -0.508), (-5.0165, 3.697342898), (-5.3975, 4.298407671), (-5.7785, 3.697342898), (-5.7785, -0.508), align=None)
    extrude(amount=BOSS_EXTRUDE9_3_DEPTH, both=True)


with BuildPart() as body_7:
    # Sketch15 → Boss-Extrude10 (new, symmetric)
    with BuildSketch(Plane.ZY.offset(1.5875)):
        Polygon((0.508, 8.3185), (-3.697342898, 8.3185), (-4.298407671, 7.9375), (-3.697342898, 7.5565), (0.508, 7.5565), align=None)
    extrude(amount=BOSS_EXTRUDE10_DEPTH, both=True)


with BuildPart() as body_8:
    # Sketch15 → Boss-Extrude10 2 (new, symmetric)
    with BuildSketch(Plane.ZY.offset(1.5875)):
        Polygon((0.508, 5.7785), (-3.697342898, 5.7785), (-4.298407671, 5.3975), (-3.697342898, 5.0165), (0.508, 5.0165), align=None)
    extrude(amount=BOSS_EXTRUDE10_2_DEPTH, both=True)


with BuildPart() as body_9:
    # Sketch15 → Boss-Extrude10 3 (new, symmetric)
    with BuildSketch(Plane.ZY.offset(1.5875)):
        Polygon((0.508, 10.8585), (-3.697342898, 10.8585), (-4.298407671, 10.4775), (-3.697342898, 10.0965), (0.508, 10.0965), align=None)
    extrude(amount=BOSS_EXTRUDE10_3_DEPTH, both=True)


solid = Compound([part.part, body_2.part, body_3.part, body_4.part, body_5.part, body_6.part, body_7.part, body_8.part, body_9.part])
